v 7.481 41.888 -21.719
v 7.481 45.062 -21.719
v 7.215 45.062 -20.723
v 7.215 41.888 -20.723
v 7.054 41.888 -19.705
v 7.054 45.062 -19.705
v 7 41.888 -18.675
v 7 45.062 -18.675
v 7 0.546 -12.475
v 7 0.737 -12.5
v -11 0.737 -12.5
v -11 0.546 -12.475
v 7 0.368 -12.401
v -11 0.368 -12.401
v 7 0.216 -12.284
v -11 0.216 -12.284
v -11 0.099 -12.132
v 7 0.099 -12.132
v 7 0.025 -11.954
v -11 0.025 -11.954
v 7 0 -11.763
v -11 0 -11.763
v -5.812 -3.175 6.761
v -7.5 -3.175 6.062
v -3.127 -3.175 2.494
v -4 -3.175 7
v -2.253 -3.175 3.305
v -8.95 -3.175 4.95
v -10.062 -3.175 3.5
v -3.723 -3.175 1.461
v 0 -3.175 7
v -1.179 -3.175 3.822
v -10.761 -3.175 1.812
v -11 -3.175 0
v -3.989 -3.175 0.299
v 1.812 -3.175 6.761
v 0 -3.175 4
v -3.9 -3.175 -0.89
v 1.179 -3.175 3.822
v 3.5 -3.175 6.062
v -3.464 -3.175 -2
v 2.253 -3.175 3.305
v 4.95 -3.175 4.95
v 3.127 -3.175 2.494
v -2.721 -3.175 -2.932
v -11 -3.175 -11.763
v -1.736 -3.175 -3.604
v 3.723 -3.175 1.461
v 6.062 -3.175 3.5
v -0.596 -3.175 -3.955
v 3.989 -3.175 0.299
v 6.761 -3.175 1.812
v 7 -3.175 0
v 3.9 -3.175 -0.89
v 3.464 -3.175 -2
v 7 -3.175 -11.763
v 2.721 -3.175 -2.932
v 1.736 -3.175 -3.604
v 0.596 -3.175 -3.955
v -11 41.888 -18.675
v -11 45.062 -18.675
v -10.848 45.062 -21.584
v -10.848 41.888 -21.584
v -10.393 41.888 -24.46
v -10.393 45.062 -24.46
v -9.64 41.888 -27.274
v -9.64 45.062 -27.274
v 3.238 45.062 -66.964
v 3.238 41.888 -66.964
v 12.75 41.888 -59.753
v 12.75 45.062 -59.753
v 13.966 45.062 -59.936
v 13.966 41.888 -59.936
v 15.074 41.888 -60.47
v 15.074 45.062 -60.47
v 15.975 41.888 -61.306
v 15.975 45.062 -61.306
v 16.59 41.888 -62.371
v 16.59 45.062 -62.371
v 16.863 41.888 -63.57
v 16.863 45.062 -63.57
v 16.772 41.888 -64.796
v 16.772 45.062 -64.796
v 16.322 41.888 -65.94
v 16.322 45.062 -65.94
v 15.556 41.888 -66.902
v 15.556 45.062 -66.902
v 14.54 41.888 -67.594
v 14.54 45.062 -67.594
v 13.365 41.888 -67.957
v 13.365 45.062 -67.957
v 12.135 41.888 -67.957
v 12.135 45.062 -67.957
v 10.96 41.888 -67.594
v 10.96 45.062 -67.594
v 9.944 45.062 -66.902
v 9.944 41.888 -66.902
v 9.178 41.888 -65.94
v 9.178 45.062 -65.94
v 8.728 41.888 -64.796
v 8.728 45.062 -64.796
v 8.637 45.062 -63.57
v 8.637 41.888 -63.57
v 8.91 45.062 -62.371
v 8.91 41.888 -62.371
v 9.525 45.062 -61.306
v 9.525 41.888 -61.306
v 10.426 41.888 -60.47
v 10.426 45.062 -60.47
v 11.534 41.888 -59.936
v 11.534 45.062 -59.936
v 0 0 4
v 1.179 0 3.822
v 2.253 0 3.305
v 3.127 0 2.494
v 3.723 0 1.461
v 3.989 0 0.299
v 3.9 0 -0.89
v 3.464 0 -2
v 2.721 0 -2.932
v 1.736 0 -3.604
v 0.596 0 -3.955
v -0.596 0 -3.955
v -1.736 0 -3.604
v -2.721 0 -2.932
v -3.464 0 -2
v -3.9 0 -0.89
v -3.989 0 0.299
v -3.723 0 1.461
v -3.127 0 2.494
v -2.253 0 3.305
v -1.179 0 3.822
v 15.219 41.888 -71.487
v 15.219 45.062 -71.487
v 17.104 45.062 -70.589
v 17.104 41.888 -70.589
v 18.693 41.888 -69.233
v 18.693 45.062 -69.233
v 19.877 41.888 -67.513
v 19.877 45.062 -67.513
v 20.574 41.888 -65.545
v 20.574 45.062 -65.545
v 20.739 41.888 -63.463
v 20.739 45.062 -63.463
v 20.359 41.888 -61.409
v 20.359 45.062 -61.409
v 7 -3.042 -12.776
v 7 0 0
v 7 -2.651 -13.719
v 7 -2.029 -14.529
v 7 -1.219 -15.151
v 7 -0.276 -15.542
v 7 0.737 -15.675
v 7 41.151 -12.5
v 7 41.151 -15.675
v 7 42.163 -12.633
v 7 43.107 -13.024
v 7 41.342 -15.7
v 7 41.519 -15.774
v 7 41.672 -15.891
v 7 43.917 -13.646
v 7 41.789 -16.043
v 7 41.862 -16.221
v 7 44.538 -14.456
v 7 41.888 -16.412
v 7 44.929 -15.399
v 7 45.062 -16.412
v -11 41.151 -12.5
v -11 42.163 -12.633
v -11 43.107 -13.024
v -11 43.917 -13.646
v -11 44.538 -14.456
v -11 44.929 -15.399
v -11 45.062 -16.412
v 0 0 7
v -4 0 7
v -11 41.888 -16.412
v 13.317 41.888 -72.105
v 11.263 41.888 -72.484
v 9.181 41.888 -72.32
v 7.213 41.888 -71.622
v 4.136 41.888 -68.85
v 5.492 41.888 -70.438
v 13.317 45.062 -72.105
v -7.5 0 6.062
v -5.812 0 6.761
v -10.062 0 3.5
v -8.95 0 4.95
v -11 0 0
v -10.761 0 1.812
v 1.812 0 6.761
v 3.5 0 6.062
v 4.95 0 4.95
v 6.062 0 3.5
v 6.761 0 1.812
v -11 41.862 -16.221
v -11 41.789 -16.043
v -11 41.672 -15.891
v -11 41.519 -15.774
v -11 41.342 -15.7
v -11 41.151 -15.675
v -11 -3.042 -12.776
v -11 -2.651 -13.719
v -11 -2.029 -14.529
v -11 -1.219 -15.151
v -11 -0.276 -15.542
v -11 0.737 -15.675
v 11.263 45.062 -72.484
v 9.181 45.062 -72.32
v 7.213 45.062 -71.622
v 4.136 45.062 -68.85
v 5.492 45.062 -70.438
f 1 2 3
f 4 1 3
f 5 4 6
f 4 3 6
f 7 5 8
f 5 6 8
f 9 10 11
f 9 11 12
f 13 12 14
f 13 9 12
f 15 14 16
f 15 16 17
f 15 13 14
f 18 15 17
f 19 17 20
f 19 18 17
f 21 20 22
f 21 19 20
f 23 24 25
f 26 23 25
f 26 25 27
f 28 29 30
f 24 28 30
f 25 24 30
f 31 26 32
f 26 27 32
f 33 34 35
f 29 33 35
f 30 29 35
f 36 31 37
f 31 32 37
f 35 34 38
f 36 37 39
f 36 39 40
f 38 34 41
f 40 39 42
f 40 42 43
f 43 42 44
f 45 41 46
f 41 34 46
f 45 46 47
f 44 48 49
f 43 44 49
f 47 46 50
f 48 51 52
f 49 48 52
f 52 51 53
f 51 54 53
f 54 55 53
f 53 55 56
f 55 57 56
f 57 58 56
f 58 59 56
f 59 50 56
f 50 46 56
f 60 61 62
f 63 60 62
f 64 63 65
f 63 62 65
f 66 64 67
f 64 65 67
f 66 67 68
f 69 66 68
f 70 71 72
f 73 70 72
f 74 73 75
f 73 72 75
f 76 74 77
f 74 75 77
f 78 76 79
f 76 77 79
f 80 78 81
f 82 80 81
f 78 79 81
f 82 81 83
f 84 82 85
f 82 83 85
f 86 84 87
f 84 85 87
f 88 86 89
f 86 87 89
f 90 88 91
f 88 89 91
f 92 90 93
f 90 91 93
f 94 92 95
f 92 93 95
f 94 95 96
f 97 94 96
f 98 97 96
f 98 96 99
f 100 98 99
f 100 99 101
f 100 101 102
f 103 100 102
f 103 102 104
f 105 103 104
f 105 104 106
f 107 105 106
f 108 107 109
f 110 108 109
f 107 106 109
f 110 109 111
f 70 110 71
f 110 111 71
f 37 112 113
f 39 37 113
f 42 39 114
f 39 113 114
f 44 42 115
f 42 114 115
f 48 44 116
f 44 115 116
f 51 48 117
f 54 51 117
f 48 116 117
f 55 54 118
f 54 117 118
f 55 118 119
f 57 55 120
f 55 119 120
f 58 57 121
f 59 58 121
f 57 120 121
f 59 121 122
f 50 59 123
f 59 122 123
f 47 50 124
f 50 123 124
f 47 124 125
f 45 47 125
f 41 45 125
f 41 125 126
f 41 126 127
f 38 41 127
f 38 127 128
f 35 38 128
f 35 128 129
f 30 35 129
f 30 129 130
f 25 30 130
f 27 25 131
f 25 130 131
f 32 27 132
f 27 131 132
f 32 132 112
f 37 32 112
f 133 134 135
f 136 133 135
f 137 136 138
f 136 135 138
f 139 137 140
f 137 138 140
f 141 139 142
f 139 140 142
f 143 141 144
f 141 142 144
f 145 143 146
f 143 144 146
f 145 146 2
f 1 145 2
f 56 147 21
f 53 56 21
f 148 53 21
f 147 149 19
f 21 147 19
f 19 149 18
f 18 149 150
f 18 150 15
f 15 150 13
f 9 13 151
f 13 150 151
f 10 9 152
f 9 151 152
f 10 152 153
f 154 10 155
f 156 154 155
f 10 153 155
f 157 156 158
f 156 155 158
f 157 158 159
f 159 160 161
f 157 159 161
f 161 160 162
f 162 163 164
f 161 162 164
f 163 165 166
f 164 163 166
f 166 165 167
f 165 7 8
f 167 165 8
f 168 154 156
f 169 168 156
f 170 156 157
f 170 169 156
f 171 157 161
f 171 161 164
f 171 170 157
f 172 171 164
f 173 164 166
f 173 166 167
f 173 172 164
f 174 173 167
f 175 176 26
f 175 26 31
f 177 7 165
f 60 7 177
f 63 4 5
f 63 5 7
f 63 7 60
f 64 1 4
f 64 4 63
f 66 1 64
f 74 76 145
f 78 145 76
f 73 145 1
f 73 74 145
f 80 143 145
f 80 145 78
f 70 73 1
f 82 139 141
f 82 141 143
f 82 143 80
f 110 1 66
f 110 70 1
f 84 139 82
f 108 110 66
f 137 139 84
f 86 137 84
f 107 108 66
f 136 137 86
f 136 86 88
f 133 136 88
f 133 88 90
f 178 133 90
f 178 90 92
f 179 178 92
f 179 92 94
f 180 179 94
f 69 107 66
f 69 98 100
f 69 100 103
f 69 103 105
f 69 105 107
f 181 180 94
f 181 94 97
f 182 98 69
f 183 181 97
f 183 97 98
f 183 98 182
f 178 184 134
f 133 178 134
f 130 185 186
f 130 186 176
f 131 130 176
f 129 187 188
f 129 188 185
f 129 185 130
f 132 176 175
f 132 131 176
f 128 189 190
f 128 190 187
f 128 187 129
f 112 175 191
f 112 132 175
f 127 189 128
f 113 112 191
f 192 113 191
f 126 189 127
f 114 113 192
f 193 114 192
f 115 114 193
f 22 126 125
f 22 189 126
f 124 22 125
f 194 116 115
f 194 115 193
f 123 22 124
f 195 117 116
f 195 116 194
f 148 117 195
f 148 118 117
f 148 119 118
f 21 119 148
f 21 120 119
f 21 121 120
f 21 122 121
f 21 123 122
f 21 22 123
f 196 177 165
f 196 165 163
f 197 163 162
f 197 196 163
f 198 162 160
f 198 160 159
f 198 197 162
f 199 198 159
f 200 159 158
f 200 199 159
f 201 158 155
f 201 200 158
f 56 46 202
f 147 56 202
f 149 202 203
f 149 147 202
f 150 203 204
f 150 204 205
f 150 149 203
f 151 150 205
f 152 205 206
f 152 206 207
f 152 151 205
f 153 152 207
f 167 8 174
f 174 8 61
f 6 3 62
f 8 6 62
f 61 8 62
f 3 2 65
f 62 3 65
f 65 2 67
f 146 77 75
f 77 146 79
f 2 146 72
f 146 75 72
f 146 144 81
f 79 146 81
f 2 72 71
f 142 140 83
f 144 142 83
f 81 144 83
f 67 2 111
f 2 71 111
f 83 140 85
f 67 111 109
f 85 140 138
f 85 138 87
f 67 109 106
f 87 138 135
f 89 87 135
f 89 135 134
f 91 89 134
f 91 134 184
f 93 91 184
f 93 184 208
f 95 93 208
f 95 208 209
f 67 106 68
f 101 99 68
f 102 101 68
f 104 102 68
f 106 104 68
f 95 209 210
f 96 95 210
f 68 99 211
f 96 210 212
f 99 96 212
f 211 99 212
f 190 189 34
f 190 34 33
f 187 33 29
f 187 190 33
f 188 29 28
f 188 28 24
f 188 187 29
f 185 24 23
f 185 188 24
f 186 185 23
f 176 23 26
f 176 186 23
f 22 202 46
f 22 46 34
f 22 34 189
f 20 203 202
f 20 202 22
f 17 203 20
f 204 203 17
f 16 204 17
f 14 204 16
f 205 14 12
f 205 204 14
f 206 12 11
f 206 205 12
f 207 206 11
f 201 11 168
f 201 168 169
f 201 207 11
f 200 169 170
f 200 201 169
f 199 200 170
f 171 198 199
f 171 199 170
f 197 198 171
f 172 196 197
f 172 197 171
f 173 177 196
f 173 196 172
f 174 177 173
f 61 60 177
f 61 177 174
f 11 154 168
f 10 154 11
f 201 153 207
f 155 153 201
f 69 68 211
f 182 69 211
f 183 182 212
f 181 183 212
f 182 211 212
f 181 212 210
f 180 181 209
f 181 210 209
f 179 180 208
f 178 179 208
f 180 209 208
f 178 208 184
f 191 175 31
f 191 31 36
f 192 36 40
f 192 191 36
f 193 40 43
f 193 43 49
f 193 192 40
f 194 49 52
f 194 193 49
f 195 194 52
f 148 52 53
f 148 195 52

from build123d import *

# Parameters (mm, degrees)
SKETCH1_R                    = 4
BASE_FLANGE1_DEPTH           = 3.175
EDGE_FLANGE1_STRIP_W         = 14.1732
EDGE_FLANGE1_STRIP_H         = 3.175
EDGE_FLANGE1_STRIP_CUT_DEPTH = 18
EDGE_FLANGE1_DEPTH           = 18
EDGE_FLANGE2_STRIP_W         = 14.1732
EDGE_FLANGE2_STRIP_H         = 3.175
EDGE_FLANGE2_STRIP_CUT_DEPTH = 18
EDGE_FLANGE2_DEPTH           = 18
SKETCH12_R                   = 4.125
BOSS_EXTRUDE1_DEPTH          = 3.175


# Sheet-metal steps are written as plain solids
with BuildPart() as part:
    # Sketch1 → Base-Flange1 (new body)
    with BuildSketch(Plane(origin=(0, 0, 0), x_dir=(1, 0, 0), z_dir=(0, 1, 0))):
        with BuildLine():
            Line((7, 0), (7, 12.5))
            Line((7, 12.5), (-11, 12.5))
            Line((-11, 12.5), (-11, 0))
            ThreePointArc((-11, 0), (-8.949747468, -4.949747468), (-4, -7))
            Line((-4, -7), (0, -7))
            ThreePointArc((0, -7), (4.949747468, -4.949747468), (7, 0))
        make_face()
        with Locations(Location((0, 0, 0), (0, 0, 270))):
            Circle(SKETCH1_R, mode=Mode.SUBTRACT)
    extrude(amount=-BASE_FLANGE1_DEPTH)

    # Edge-Flange1 strip (across the edge) → Edge-Flange1 strip cut (cut)
    with BuildSketch(Plane(origin=(7, 0, -12.5), x_dir=(0, 0, 1), z_dir=(-1, 0, 0))):
        with Locations((-6.35, -1.5875)):
            Rectangle(EDGE_FLANGE1_STRIP_W, EDGE_FLANGE1_STRIP_H)
    extrude(amount=EDGE_FLANGE1_STRIP_CUT_DEPTH, mode=Mode.SUBTRACT)

    # Edge-Flange1 section (across the edge) → Edge-Flange1 (add)
    with BuildSketch(Plane(origin=(7, 0, -12.5), x_dir=(0, 0, 1), z_dir=(-1, 0, 0))):
        with BuildLine():
            Line((-3.175, 0.7366), (-3.175, 41.8875))
            Line((-3.175, 41.8875), (0, 41.8875))
            Line((0, 41.8875), (0, 0.7366))
            ThreePointArc((0, 0.7366), (0.215745145, 0.215745145), (0.7366, 0))
            Line((0.7366, 0), (0.7366, -3.175))
            ThreePointArc((0.7366, -3.175), (-2.029318885, -2.029318885), (-3.175, 0.7366))
        make_face()
    extrude(amount=EDGE_FLANGE1_DEPTH)

    # Edge-Flange2 strip (across the edge) → Edge-Flange2 strip cut (cut)
    with BuildSketch(Plane(origin=(-11, 41.8875, -15.675), x_dir=(0, -1, 0), z_dir=(1, 0, 0))):
        with Locations((-6.35, -1.5875)):
            Rectangle(EDGE_FLANGE2_STRIP_W, EDGE_FLANGE2_STRIP_H)
    extrude(amount=EDGE_FLANGE2_STRIP_CUT_DEPTH, mode=Mode.SUBTRACT)

    # Edge-Flange2 section (across the edge) → Edge-Flange2 (add)
    with BuildSketch(Plane(origin=(-11, 41.8875, -15.675), x_dir=(0, -1, 0), z_dir=(1, 0, 0))):
        with BuildLine():
            Line((-3.175, 0.7366), (-3.175, 3))
            Line((-3.175, 3), (0, 3))
            Line((0, 3), (0, 0.7366))
            ThreePointArc((0, 0.7366), (0.215745145, 0.215745145), (0.7366, 0))
            Line((0.7366, 0), (0.7366, -3.175))
            ThreePointArc((0.7366, -3.175), (-2.029318885, -2.029318885), (-3.175, 0.7366))
        make_face()
    extrude(amount=EDGE_FLANGE2_DEPTH)

    # Sketch12 → Boss-Extrude1 (add)
    with BuildSketch(Plane(origin=(0, 45.0625, 0), x_dir=(1, 0, 0), z_dir=(0, 1, 0))):
        with BuildLine():
            Line((7, 18.675), (-11, 18.675))
            ThreePointArc((-11, 18.675), (-10.657865377, 23.027974643), (-9.639863923, 27.27404546))
            Line((-9.639863923, 27.27404546), (3.238154817, 66.964241218))
            ThreePointArc((3.238154817, 66.964241218), (7.212761051, 71.621798227), (13.316622217, 72.104717351))
            Line((13.316622217, 72.104717351), (15.218990158, 71.487468443))
            ThreePointArc((15.218990158, 71.487468443), (19.876547167, 67.512862208), (20.359466291, 61.409001043))
            Line((20.359466291, 61.409001043), (7.481447551, 21.718805285))
            ThreePointArc((7.481447551, 21.718805285), (7.121105439, 20.215823024), (7, 18.675))
        make_face()
        with Locations(Location((12.749994525, 63.877996676, 0), (0, 0, 270))):
            Circle(SKETCH12_R, mode=Mode.SUBTRACT)
    extrude(amount=-BOSS_EXTRUDE1_DEPTH)


solid = part.part
